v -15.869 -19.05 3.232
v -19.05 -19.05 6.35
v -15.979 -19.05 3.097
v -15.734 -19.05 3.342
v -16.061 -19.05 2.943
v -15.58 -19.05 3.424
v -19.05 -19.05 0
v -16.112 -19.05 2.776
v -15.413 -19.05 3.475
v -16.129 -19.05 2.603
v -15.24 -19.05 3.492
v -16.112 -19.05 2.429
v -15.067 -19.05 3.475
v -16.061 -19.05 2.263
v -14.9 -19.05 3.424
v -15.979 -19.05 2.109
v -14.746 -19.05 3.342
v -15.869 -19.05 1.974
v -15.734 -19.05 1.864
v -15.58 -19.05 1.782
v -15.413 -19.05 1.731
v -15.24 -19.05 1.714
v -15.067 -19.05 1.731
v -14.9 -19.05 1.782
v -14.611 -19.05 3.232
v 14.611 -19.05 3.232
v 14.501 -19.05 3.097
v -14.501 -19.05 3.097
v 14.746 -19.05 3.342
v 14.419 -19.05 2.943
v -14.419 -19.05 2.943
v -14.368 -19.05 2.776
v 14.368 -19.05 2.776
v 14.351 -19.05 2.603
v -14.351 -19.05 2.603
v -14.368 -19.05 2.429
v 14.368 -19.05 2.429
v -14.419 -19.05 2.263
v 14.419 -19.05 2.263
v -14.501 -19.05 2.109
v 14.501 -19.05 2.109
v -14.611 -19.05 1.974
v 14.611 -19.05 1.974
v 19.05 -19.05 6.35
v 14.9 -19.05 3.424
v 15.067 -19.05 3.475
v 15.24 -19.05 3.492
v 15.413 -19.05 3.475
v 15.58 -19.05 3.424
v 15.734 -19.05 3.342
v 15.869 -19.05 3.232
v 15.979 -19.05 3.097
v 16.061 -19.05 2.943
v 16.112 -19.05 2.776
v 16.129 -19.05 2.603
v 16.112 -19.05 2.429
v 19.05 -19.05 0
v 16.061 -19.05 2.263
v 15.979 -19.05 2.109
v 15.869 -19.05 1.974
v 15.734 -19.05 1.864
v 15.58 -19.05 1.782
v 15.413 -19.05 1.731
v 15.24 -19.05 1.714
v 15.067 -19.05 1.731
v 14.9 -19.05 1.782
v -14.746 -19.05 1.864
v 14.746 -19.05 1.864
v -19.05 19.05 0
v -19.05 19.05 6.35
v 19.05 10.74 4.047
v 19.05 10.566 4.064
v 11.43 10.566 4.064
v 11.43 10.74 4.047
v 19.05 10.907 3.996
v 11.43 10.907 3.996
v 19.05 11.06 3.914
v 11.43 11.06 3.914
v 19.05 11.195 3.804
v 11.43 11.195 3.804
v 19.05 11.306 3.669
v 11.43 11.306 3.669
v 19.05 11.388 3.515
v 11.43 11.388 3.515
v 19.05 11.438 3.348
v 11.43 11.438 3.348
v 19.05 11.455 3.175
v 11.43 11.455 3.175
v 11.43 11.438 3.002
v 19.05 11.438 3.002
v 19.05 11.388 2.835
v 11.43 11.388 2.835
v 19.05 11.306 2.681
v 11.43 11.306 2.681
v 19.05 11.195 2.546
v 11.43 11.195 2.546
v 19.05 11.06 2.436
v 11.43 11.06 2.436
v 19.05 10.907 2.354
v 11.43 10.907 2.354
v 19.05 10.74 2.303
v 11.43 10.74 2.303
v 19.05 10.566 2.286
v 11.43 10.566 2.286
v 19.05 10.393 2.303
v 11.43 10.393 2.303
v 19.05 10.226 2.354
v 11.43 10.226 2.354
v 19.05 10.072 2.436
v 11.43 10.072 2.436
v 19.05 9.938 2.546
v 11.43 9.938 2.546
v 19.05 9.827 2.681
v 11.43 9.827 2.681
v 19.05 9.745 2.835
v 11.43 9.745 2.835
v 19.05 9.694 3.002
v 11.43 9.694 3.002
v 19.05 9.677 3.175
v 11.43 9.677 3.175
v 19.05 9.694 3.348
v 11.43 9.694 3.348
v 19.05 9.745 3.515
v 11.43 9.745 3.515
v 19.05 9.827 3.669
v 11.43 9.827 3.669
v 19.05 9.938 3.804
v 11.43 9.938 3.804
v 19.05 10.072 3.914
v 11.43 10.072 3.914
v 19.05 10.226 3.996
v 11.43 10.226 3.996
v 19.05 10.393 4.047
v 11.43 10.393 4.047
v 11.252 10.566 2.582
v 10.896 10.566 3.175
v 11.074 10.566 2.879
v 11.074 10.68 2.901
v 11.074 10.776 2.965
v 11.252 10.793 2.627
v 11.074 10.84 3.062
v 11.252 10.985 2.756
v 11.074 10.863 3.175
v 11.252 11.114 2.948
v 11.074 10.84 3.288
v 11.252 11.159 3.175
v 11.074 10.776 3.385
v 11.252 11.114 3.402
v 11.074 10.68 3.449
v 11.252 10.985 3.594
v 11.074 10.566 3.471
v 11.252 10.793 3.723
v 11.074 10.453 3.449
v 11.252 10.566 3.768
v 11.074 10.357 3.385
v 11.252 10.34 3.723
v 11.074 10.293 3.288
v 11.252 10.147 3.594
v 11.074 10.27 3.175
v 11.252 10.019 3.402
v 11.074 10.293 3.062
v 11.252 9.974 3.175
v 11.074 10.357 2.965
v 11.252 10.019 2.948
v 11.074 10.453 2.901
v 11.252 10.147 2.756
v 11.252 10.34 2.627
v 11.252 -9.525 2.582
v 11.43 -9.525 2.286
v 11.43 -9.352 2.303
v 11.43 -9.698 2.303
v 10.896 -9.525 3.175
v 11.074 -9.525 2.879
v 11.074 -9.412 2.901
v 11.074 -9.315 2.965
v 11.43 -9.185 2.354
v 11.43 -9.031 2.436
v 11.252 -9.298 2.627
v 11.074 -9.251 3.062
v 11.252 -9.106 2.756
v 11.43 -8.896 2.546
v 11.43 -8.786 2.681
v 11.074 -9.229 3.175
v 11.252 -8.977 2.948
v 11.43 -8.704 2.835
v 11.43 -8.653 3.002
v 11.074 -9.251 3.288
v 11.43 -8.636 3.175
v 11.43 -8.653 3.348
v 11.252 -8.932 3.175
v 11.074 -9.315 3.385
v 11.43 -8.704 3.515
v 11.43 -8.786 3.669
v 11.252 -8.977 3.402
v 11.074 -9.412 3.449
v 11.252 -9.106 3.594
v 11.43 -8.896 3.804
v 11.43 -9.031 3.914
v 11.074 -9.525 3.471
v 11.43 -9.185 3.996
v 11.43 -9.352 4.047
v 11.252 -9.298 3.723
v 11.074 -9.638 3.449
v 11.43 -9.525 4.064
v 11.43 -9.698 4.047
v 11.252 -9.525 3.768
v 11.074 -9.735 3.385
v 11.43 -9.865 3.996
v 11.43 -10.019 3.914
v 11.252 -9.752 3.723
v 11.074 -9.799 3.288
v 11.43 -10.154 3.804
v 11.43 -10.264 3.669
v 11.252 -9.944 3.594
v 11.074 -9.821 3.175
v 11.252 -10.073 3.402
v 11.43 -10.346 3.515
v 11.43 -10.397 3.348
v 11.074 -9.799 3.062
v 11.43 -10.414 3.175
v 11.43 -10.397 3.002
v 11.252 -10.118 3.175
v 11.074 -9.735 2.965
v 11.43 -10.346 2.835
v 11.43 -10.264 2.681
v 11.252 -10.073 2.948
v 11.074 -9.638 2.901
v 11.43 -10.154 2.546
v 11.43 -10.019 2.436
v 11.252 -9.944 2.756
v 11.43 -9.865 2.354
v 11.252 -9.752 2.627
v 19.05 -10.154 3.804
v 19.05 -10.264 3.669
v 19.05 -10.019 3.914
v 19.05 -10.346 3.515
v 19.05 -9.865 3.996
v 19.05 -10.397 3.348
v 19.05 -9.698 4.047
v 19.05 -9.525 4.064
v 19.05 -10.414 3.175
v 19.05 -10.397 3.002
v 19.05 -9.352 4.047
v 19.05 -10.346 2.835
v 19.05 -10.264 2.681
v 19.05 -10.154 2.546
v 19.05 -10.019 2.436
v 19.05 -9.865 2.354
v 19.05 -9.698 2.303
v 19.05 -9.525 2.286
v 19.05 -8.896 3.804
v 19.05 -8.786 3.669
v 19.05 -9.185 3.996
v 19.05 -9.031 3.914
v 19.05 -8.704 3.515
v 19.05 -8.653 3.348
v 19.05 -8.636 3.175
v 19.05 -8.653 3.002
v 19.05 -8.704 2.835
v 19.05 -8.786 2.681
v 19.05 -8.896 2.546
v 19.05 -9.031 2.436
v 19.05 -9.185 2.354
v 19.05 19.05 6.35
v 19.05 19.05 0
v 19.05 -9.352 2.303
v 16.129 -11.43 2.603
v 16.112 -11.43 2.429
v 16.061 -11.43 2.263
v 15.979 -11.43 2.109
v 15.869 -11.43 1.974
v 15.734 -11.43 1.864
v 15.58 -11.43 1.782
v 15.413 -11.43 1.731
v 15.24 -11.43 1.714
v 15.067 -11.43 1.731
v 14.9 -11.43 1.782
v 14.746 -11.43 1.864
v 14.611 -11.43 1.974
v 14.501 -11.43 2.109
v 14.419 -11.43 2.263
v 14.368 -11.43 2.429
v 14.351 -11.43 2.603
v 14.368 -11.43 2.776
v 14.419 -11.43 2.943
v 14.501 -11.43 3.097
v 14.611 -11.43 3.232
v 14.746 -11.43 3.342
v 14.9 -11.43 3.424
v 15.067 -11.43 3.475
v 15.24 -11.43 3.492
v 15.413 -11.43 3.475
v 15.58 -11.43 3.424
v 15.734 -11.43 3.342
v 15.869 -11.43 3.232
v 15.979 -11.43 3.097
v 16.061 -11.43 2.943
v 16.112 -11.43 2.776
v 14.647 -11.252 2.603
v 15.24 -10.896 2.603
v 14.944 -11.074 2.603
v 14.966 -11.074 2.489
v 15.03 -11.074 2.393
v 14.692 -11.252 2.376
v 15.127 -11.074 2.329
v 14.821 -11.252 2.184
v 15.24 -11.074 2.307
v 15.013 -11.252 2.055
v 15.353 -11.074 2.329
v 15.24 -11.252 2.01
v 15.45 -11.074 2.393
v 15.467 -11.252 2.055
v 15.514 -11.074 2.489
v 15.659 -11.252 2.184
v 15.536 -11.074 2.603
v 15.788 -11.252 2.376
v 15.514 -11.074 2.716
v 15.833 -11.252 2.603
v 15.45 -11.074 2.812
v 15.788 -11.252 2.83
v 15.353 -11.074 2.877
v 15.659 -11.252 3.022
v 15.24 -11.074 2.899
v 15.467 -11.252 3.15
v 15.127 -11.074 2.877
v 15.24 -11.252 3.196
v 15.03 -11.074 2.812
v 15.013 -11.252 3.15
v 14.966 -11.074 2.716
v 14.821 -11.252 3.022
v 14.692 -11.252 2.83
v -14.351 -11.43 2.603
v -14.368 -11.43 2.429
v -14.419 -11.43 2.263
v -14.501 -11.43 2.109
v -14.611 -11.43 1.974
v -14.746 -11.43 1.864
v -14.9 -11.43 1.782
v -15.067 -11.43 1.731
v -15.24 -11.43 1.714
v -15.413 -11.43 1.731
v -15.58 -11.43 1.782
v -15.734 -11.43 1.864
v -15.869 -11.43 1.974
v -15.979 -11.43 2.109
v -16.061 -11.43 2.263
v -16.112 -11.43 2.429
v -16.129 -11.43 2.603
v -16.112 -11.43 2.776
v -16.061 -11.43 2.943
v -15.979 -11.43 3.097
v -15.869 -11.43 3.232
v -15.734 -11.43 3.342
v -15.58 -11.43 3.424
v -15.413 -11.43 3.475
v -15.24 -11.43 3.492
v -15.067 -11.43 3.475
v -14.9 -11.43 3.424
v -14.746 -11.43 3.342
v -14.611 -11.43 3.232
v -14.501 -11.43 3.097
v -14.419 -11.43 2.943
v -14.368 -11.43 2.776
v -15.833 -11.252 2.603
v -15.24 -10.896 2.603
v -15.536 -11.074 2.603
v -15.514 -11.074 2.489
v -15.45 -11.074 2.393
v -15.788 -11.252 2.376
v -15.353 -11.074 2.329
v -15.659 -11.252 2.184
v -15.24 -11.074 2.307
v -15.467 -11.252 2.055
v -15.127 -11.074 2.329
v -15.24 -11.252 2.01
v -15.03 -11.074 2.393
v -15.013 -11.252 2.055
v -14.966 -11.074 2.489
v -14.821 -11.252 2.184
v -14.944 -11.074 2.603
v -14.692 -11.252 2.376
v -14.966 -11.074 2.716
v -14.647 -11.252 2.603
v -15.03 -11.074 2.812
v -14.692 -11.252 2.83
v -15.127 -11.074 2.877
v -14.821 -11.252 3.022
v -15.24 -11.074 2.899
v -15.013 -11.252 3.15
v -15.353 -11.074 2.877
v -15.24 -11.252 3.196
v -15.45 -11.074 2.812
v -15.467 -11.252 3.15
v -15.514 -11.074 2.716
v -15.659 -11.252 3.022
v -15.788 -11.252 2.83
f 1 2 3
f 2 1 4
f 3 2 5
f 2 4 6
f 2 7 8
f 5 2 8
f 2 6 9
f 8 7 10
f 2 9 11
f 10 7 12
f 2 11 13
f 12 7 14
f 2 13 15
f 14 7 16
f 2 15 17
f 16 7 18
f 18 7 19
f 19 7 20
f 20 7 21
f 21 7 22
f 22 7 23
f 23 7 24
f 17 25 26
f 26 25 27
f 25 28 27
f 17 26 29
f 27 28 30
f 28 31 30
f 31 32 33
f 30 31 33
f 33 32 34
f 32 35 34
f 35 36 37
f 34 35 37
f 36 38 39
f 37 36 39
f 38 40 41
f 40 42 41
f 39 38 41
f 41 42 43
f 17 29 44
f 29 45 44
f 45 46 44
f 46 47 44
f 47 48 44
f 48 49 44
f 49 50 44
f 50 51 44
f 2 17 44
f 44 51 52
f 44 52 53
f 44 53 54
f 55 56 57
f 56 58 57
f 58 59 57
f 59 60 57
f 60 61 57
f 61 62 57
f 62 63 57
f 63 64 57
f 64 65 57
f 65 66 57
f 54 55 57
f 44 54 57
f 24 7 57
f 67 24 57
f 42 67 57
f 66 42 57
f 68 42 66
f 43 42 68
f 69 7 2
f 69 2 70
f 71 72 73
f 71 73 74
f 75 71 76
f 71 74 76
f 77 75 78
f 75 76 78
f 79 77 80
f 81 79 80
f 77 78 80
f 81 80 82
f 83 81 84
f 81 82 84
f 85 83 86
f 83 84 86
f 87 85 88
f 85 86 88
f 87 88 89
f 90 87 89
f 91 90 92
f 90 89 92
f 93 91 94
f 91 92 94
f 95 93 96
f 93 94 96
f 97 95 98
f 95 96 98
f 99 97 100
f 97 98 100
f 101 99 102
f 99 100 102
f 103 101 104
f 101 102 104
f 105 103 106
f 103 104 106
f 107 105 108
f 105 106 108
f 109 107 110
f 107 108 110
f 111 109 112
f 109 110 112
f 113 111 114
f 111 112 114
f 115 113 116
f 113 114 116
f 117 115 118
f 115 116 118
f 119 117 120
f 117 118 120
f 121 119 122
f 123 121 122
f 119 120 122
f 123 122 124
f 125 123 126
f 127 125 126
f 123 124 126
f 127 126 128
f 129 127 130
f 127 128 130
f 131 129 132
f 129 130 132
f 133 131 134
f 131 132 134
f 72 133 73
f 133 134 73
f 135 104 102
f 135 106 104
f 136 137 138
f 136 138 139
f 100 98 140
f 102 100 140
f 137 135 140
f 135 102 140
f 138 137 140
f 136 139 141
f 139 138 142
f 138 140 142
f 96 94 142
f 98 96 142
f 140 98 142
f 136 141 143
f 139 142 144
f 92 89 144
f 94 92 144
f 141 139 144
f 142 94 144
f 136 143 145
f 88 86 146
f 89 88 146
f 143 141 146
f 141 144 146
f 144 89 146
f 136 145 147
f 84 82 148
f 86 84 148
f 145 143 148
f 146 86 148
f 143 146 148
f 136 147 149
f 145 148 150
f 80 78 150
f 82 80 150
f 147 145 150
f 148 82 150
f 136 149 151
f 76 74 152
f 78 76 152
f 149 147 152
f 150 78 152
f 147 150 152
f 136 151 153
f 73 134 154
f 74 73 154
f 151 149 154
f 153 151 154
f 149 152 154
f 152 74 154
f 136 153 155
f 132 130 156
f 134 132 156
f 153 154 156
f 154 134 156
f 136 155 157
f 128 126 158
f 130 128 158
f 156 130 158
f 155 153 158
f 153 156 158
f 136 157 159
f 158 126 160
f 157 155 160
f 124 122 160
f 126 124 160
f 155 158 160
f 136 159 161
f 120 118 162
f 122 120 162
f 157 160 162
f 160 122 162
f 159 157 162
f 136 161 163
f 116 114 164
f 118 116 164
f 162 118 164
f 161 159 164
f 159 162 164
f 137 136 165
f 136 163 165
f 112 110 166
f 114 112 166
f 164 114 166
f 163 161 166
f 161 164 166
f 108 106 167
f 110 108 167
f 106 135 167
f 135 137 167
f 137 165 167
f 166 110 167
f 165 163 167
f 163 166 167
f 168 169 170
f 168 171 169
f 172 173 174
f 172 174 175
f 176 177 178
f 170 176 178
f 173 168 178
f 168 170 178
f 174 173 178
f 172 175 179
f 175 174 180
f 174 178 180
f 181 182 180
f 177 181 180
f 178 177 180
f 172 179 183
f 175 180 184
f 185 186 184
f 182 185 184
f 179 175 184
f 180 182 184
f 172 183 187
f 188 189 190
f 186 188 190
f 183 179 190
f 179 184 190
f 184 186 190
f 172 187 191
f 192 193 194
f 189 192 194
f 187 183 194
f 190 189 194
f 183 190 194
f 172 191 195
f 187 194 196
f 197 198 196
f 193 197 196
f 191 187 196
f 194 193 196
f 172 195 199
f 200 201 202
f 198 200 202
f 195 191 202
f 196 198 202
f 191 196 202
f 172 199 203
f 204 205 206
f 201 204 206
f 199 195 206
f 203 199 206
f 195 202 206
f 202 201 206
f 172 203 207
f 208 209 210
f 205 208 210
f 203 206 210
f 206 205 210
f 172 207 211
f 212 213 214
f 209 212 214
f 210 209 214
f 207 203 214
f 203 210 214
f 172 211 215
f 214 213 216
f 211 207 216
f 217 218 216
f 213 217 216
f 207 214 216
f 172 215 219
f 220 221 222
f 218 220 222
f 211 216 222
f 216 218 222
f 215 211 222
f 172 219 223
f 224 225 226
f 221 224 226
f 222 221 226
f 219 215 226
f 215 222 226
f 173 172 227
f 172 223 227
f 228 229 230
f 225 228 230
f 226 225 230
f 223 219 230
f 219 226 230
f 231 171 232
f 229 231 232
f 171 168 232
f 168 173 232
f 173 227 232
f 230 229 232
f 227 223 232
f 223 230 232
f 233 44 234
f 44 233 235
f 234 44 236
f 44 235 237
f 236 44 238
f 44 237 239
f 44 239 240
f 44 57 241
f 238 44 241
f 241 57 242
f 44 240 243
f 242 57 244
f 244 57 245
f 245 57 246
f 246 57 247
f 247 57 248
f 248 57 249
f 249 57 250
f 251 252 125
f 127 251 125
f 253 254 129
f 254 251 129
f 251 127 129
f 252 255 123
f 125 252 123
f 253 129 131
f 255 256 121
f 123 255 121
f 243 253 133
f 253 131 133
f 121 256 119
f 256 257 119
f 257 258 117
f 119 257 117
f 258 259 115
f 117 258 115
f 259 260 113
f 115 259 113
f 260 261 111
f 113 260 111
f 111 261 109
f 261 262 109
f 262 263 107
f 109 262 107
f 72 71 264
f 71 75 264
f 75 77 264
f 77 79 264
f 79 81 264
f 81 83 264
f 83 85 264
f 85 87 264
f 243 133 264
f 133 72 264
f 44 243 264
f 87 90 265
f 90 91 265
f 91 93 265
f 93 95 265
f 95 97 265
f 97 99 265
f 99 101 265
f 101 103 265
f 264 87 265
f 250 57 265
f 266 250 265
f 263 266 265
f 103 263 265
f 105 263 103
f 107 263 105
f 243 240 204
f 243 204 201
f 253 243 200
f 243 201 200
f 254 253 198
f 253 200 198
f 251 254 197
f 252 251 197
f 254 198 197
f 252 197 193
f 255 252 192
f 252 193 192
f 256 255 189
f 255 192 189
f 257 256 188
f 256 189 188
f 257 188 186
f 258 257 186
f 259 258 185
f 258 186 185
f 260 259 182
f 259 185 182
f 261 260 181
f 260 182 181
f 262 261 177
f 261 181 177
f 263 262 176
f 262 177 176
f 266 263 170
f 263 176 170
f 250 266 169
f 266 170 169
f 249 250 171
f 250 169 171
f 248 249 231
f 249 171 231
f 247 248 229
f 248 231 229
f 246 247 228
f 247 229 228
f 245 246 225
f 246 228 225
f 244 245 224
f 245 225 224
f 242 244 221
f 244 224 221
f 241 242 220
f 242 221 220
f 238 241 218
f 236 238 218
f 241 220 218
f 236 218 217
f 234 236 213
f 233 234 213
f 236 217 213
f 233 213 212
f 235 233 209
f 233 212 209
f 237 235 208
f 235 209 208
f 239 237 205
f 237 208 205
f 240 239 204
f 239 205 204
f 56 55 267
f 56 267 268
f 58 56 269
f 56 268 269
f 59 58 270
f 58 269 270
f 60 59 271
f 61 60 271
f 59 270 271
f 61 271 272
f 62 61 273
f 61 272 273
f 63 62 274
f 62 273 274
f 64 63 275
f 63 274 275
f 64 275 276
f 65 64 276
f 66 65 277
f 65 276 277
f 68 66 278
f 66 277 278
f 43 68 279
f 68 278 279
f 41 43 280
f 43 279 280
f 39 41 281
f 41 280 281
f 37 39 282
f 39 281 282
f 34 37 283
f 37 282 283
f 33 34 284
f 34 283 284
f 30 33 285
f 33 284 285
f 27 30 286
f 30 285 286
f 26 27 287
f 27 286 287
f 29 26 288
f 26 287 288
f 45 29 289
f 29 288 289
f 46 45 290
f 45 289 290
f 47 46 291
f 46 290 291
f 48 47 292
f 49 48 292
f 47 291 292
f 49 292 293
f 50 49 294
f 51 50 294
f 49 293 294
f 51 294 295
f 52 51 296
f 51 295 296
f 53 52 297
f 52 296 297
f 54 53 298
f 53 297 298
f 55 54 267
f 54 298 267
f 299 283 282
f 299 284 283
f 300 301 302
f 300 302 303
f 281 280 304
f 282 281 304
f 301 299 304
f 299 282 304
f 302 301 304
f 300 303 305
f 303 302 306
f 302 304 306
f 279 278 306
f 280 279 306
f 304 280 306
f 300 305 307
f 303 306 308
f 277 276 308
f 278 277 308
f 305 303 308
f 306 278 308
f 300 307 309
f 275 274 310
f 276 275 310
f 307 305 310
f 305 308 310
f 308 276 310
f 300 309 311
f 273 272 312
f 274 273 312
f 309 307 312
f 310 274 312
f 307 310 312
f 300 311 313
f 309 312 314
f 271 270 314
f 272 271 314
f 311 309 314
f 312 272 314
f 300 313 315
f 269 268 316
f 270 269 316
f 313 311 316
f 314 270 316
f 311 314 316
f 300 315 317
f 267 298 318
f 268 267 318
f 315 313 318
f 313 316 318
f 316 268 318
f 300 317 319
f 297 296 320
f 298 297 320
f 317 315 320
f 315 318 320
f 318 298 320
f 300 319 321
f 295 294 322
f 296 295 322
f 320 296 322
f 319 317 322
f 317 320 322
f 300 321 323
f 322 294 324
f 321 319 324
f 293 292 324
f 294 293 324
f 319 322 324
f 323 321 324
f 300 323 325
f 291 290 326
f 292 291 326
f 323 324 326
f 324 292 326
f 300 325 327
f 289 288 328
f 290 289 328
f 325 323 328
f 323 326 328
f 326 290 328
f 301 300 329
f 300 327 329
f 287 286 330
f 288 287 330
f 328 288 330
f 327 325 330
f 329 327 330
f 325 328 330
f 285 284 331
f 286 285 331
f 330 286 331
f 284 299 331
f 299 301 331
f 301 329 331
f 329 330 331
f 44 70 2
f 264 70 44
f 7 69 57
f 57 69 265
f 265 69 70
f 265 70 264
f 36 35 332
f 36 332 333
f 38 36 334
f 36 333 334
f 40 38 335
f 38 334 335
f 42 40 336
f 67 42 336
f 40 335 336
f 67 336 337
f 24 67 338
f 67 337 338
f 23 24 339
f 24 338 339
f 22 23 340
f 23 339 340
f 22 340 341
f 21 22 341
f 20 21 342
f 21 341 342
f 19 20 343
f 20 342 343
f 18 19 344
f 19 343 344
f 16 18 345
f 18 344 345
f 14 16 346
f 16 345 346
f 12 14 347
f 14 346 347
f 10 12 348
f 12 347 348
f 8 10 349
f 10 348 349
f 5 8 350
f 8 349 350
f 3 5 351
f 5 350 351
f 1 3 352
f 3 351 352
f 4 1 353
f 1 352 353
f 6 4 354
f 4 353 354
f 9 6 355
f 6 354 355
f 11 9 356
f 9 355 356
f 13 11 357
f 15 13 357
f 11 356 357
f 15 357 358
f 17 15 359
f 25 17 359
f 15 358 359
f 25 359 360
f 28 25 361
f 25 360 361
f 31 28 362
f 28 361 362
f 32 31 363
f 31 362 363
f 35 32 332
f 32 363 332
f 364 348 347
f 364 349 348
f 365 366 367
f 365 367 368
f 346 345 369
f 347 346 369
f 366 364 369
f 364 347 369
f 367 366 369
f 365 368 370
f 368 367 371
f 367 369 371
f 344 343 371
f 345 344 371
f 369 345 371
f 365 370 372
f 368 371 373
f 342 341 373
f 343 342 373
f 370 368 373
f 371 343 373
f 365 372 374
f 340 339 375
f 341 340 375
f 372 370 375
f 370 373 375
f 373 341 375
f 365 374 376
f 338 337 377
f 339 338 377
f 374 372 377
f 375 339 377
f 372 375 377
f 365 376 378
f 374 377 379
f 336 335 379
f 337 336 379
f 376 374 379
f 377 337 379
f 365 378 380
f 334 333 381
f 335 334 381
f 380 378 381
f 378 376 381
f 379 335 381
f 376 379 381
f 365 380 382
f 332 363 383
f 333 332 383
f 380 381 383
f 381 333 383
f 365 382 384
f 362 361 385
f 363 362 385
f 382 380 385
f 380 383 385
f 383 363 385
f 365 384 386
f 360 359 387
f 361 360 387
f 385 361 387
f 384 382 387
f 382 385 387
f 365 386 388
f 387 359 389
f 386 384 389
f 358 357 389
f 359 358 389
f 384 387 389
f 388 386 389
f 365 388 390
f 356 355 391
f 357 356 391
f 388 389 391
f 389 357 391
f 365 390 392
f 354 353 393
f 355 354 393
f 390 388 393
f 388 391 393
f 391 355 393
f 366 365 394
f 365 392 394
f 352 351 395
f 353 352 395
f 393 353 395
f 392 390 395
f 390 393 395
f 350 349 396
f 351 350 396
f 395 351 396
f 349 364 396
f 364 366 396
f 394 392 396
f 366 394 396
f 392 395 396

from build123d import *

# Parameters (mm, degrees)
SKETCH1_W                     = 38.1
SKETCH1_H                     = 38.1
BOSS_EXTRUDE1_DEPTH           = 6.35
TAP_DRILL_FOR_2_64_TAP1_D     = 1.778
TAP_DRILL_FOR_2_64_TAP1_DEPTH = 7.62
TAP_DRILL_FOR_2_64_TAP1_TIP   = 0.53416509
TAP_DRILL_FOR_2_64_TAP2_D     = 1.778
TAP_DRILL_FOR_2_64_TAP2_DEPTH = 7.62
TAP_DRILL_FOR_2_64_TAP2_TIP   = 0.53416509


with BuildPart() as part:
    # Sketch1 → Boss-Extrude1 (new body)
    with BuildSketch(Plane.XY):
        Rectangle(SKETCH1_W, SKETCH1_H)
    extrude(amount=BOSS_EXTRUDE1_DEPTH)

    # Tap Drill for #2-64 Tap1
    with Locations(Plane(origin=(0, -19.05, 0), x_dir=(-1, 0, 0), z_dir=(0, -1, 0))):
        with Locations((-15.24, -2.6029), (15.24, -2.6029)):
            Hole(TAP_DRILL_FOR_2_64_TAP1_D / 2, depth=TAP_DRILL_FOR_2_64_TAP1_DEPTH)
            with Locations((0, 0, -(TAP_DRILL_FOR_2_64_TAP1_DEPTH + TAP_DRILL_FOR_2_64_TAP1_TIP / 2))):  # 118° drill point
                Cone(0, TAP_DRILL_FOR_2_64_TAP1_D / 2, TAP_DRILL_FOR_2_64_TAP1_TIP, mode=Mode.SUBTRACT)

    # Tap Drill for #2-64 Tap2
    with Locations(Plane(origin=(19.05, 0, 0), x_dir=(0, 0, -1), z_dir=(1, 0, 0))):
        with Locations((-3.175, 10.5664), (-3.175, -9.525)):
            Hole(TAP_DRILL_FOR_2_64_TAP2_D / 2, depth=TAP_DRILL_FOR_2_64_TAP2_DEPTH)
            with Locations((0, 0, -(TAP_DRILL_FOR_2_64_TAP2_DEPTH + TAP_DRILL_FOR_2_64_TAP2_TIP / 2))):  # 118° drill point
                Cone(0, TAP_DRILL_FOR_2_64_TAP2_D / 2, TAP_DRILL_FOR_2_64_TAP2_TIP, mode=Mode.SUBTRACT)


solid = part.part
